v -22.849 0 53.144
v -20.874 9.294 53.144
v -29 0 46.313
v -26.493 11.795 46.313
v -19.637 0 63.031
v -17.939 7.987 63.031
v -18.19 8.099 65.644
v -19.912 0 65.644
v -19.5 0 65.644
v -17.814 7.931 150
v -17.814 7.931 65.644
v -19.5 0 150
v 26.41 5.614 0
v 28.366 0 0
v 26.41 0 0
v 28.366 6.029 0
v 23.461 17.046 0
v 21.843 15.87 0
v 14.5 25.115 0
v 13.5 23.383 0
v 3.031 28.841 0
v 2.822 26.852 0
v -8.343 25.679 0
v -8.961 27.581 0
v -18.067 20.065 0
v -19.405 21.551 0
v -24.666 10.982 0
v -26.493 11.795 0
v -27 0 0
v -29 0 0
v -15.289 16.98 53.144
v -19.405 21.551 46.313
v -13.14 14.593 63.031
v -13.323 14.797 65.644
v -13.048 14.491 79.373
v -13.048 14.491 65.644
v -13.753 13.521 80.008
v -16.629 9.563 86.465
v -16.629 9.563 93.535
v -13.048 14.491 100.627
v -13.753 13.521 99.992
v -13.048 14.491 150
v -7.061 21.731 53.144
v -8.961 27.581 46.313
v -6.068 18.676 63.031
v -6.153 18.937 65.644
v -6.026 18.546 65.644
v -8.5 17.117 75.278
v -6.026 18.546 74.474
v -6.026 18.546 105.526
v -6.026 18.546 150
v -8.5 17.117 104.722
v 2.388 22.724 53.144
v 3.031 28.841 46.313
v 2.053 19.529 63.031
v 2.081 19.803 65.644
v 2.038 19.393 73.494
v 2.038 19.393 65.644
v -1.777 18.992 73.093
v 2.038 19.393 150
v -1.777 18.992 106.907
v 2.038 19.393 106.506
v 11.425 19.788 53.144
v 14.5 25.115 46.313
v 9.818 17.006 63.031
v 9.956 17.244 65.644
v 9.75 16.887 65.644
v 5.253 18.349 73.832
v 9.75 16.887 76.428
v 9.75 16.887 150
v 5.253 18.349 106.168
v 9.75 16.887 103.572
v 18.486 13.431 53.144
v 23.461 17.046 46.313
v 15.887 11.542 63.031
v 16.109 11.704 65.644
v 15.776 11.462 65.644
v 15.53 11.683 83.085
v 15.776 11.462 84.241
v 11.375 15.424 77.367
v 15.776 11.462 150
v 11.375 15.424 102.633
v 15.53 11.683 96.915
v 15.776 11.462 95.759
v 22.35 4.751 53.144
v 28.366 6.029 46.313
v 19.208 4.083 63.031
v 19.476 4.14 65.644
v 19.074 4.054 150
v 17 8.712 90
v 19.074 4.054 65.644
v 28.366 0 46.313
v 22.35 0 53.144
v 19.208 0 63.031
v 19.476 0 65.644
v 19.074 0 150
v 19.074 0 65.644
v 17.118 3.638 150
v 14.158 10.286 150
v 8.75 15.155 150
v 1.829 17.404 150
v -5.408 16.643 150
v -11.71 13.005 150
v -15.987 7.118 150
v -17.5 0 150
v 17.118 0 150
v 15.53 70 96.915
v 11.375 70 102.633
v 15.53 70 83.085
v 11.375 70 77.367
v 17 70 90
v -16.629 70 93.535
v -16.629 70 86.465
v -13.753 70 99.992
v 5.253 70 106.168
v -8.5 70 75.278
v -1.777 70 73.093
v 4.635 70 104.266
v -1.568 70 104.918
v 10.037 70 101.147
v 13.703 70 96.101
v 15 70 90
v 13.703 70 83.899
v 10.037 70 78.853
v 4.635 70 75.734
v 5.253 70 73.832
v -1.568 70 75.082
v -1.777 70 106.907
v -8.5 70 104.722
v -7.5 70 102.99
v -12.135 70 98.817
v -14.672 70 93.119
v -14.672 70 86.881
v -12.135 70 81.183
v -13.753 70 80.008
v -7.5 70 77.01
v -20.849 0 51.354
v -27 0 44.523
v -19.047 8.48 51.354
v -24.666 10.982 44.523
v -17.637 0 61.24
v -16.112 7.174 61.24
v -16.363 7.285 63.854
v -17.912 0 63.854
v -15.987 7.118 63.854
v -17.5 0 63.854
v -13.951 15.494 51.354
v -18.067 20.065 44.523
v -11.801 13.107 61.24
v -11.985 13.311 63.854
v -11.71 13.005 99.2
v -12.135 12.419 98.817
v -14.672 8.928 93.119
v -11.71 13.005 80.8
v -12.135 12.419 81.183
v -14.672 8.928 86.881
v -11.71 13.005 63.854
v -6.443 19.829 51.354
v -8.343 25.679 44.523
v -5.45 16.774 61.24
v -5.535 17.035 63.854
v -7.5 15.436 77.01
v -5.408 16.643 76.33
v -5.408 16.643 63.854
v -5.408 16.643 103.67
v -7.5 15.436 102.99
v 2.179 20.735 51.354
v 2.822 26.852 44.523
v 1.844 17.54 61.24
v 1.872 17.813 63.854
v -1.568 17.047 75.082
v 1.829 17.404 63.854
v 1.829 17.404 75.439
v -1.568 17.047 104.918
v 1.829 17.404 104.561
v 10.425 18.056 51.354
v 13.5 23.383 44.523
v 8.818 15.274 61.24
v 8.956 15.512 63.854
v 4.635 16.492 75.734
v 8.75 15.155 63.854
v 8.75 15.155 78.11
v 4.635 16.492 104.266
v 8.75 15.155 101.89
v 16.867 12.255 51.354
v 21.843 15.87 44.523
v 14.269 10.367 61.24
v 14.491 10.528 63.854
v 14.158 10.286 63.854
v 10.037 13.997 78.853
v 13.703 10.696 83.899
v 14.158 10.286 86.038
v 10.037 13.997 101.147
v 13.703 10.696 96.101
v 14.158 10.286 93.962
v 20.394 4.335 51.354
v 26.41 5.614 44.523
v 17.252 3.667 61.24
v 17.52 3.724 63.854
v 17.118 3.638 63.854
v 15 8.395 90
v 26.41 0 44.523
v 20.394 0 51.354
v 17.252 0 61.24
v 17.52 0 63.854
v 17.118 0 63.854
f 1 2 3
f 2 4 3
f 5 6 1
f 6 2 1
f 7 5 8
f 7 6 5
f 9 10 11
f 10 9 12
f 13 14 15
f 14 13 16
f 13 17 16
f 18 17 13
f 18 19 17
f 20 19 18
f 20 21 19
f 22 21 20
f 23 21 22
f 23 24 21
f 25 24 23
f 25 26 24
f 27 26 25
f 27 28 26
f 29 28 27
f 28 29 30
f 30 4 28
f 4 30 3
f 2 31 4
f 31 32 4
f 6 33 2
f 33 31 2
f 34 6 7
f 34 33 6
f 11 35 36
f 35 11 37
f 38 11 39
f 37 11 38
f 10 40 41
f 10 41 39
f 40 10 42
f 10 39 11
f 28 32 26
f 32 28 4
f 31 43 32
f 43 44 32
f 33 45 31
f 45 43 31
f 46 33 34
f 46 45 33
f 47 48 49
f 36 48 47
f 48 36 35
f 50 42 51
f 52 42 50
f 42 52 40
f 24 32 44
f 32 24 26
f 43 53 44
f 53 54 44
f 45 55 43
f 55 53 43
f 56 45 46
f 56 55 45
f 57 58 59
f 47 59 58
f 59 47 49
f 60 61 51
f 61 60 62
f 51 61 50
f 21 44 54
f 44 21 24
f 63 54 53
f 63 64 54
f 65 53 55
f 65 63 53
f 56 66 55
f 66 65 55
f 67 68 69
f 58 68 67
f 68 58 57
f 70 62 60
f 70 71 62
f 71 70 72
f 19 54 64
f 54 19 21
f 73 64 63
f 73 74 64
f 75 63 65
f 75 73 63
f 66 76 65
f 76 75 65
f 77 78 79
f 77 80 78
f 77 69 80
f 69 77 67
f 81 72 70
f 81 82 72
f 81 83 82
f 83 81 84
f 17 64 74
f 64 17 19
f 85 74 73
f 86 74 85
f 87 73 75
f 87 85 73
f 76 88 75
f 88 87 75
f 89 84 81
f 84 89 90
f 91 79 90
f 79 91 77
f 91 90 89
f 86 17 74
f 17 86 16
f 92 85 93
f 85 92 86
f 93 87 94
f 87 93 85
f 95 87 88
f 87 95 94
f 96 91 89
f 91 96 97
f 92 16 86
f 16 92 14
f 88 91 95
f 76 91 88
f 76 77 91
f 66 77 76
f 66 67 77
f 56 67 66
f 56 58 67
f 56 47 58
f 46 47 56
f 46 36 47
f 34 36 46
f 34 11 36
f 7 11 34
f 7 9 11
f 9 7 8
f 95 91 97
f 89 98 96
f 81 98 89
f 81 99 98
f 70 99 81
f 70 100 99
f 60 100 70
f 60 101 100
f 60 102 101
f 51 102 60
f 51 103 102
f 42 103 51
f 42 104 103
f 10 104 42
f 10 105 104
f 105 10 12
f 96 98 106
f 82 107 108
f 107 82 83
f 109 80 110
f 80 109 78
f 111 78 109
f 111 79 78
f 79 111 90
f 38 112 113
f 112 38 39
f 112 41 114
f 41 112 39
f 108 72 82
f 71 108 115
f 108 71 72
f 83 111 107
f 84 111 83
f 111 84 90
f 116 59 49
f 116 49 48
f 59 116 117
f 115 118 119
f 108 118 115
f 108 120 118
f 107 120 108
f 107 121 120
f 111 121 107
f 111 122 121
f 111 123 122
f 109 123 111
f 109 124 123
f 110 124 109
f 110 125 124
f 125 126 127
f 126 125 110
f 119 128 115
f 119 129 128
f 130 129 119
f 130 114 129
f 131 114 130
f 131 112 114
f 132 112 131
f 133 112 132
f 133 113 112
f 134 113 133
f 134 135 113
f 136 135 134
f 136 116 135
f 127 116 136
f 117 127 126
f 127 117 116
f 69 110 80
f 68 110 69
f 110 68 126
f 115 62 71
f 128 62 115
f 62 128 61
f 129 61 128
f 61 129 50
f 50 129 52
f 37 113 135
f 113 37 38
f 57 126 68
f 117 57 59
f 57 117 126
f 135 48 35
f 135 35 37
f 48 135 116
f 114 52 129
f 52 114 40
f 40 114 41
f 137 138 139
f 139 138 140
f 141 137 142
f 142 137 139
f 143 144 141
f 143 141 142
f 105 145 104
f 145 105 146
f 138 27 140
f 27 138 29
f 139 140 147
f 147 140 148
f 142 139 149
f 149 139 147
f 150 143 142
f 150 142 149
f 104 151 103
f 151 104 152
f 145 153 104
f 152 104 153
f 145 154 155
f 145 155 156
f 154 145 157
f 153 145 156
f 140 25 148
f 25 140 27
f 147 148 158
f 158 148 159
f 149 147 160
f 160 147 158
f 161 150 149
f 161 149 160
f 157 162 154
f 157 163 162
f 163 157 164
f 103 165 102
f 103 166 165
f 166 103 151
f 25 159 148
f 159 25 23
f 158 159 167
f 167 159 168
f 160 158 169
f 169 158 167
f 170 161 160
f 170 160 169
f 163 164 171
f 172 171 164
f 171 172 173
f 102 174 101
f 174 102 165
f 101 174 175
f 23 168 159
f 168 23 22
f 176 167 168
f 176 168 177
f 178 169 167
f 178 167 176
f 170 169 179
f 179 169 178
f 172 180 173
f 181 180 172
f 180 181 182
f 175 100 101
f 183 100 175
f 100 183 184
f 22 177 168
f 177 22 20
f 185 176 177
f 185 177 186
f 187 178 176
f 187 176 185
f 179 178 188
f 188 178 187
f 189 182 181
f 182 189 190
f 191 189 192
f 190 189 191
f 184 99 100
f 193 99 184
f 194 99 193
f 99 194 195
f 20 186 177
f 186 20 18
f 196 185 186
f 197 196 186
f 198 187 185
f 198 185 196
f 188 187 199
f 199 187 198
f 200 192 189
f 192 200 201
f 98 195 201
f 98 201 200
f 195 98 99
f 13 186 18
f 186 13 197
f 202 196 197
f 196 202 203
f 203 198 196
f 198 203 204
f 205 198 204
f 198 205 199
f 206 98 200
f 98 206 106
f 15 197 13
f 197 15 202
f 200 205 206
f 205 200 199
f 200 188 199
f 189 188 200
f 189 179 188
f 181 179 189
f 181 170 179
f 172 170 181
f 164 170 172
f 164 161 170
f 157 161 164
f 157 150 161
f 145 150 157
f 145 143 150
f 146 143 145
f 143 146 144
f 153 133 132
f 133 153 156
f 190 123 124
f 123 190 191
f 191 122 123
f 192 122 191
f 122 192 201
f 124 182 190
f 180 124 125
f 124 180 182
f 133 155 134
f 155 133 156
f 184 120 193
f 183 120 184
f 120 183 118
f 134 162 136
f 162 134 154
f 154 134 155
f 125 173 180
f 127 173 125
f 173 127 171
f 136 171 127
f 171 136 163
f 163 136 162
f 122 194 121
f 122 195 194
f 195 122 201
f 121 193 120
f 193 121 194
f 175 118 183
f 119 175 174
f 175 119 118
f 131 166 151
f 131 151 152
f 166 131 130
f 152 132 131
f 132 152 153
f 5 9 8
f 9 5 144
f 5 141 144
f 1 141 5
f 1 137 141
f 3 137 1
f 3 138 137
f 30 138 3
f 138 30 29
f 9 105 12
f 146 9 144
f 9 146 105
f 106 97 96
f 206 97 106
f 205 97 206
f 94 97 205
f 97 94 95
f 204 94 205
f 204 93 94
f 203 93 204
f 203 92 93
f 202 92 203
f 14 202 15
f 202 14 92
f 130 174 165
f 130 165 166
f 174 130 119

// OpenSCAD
// Vacuum T-adapter
// Author: Sebastian Bär
//
// This 3D model is licensed under the terms of the GNU Public License (GPL) V3
//
// The model creates two tubes with a T-style intersection.
// Each opening can have a differente diameter.
//
//          Flange           .----. Intersecting tube 
//          --------.        |    |
//          |         `------+    +------.
// Wide end |                            |  Narrow end
//          |         .------------------'
//          ---------'
//
// Configuration parameters

$fn = 15;

material_width = 4;                     // width of the material of the tubes
d_lateral = 58;                         // diameter of the straight part of the T
d_lateral_narrow = 35 + material_width; // diameter of the narrow end
l_lateral = 150;                        // length of the straight part of the T
d_across = 34;                          // diameter of the intersecting pipe
l_across = 70;                          // length of the intersecting pipe
offset_across = l_lateral * 0.6;        // position of the intersecting pipe
r_flange = 25;                          // radius of the flange between narrow and wide end
l_flange = 50;                          // length of the flange
cut = "lower";                          // cut in half away for gluing ("none", "upper", "lower")

// Derived parameters

d_inner_lateral = d_lateral - material_width;
d_inner_lateral_narrow = d_lateral_narrow - material_width;
d_inner_across = d_across - material_width;

r_lateral = d_lateral / 2;
r_lateral_narrow = d_lateral_narrow / 2;
r_inner_lateral = d_inner_lateral / 2;
r_inner_lateral_narrow = d_inner_lateral_narrow / 2;

difference()
{
    union()
    {
        LateralCylinder(r_lateral, r_lateral_narrow, l_lateral, l_flange, r_flange);
        AcrossCylinder(d_across, l_across, offset_across);
    }
    union()
    {
        LateralCylinder(r_inner_lateral, r_inner_lateral_narrow, l_lateral, l_flange - material_width, r_flange);
        AcrossCylinder(d_inner_across, l_across, offset_across);
        
        // Cut away one half for gluing if necessary.
	    if(cut == "lower")
	    {
	    	translate([-r_lateral, -r_lateral, 0]) cube([d_lateral, r_lateral, l_lateral,]);
	    }
	    else if(cut == "upper")
	    {
	    	translate([-r_lateral, 0, 0]) cube([d_lateral, l_across, l_lateral,]);    	
	    }
    }
}

// Lateral cylinder
//
// Parameters:
//
//	r         - radius of the wide end
//  r_narrow   - radius of the narrow end
//  l         - overall length
//  l_flange  - length of the adapter flange
//  r_flange  - radius of the smooth transition between flange and cylinder
//
module LateralCylinder(r, r_narrow, l, l_flange, r_flange)
{
    dist_r = r_flange - r_narrow;
    l_transition = sqrt((2 * r_flange * dist_r) - pow(dist_r, 2));

    echo("r_lateral:", r_lateral);
    echo("transition: ", l_transition);
    echo("distr_r: ", dist_r);
   
    rotate_extrude(convexity = 10)
    rotate([180, 0, 90])
        difference()
        {
            union()
            {
                square([l, r_narrow]);
                square([l_flange + l_transition, r]);
            }
            translate([l_flange + l_transition, r_narrow + r_flange, 0]) circle(r_flange);
        }
}

// Intersecting cylinder
// 
// Parameters:
//
//	diameter - the cylinder diameter
//  length   - measured from the middle of the lateral cylinder
//  offset   - the position of the intersecting cylinder on the lateral cylinder
//
module AcrossCylinder(d, l, offset)
{
    rotate([-90, 0, 0]) translate([0, -offset, 0]) cylinder(d = d, h = l);
}
